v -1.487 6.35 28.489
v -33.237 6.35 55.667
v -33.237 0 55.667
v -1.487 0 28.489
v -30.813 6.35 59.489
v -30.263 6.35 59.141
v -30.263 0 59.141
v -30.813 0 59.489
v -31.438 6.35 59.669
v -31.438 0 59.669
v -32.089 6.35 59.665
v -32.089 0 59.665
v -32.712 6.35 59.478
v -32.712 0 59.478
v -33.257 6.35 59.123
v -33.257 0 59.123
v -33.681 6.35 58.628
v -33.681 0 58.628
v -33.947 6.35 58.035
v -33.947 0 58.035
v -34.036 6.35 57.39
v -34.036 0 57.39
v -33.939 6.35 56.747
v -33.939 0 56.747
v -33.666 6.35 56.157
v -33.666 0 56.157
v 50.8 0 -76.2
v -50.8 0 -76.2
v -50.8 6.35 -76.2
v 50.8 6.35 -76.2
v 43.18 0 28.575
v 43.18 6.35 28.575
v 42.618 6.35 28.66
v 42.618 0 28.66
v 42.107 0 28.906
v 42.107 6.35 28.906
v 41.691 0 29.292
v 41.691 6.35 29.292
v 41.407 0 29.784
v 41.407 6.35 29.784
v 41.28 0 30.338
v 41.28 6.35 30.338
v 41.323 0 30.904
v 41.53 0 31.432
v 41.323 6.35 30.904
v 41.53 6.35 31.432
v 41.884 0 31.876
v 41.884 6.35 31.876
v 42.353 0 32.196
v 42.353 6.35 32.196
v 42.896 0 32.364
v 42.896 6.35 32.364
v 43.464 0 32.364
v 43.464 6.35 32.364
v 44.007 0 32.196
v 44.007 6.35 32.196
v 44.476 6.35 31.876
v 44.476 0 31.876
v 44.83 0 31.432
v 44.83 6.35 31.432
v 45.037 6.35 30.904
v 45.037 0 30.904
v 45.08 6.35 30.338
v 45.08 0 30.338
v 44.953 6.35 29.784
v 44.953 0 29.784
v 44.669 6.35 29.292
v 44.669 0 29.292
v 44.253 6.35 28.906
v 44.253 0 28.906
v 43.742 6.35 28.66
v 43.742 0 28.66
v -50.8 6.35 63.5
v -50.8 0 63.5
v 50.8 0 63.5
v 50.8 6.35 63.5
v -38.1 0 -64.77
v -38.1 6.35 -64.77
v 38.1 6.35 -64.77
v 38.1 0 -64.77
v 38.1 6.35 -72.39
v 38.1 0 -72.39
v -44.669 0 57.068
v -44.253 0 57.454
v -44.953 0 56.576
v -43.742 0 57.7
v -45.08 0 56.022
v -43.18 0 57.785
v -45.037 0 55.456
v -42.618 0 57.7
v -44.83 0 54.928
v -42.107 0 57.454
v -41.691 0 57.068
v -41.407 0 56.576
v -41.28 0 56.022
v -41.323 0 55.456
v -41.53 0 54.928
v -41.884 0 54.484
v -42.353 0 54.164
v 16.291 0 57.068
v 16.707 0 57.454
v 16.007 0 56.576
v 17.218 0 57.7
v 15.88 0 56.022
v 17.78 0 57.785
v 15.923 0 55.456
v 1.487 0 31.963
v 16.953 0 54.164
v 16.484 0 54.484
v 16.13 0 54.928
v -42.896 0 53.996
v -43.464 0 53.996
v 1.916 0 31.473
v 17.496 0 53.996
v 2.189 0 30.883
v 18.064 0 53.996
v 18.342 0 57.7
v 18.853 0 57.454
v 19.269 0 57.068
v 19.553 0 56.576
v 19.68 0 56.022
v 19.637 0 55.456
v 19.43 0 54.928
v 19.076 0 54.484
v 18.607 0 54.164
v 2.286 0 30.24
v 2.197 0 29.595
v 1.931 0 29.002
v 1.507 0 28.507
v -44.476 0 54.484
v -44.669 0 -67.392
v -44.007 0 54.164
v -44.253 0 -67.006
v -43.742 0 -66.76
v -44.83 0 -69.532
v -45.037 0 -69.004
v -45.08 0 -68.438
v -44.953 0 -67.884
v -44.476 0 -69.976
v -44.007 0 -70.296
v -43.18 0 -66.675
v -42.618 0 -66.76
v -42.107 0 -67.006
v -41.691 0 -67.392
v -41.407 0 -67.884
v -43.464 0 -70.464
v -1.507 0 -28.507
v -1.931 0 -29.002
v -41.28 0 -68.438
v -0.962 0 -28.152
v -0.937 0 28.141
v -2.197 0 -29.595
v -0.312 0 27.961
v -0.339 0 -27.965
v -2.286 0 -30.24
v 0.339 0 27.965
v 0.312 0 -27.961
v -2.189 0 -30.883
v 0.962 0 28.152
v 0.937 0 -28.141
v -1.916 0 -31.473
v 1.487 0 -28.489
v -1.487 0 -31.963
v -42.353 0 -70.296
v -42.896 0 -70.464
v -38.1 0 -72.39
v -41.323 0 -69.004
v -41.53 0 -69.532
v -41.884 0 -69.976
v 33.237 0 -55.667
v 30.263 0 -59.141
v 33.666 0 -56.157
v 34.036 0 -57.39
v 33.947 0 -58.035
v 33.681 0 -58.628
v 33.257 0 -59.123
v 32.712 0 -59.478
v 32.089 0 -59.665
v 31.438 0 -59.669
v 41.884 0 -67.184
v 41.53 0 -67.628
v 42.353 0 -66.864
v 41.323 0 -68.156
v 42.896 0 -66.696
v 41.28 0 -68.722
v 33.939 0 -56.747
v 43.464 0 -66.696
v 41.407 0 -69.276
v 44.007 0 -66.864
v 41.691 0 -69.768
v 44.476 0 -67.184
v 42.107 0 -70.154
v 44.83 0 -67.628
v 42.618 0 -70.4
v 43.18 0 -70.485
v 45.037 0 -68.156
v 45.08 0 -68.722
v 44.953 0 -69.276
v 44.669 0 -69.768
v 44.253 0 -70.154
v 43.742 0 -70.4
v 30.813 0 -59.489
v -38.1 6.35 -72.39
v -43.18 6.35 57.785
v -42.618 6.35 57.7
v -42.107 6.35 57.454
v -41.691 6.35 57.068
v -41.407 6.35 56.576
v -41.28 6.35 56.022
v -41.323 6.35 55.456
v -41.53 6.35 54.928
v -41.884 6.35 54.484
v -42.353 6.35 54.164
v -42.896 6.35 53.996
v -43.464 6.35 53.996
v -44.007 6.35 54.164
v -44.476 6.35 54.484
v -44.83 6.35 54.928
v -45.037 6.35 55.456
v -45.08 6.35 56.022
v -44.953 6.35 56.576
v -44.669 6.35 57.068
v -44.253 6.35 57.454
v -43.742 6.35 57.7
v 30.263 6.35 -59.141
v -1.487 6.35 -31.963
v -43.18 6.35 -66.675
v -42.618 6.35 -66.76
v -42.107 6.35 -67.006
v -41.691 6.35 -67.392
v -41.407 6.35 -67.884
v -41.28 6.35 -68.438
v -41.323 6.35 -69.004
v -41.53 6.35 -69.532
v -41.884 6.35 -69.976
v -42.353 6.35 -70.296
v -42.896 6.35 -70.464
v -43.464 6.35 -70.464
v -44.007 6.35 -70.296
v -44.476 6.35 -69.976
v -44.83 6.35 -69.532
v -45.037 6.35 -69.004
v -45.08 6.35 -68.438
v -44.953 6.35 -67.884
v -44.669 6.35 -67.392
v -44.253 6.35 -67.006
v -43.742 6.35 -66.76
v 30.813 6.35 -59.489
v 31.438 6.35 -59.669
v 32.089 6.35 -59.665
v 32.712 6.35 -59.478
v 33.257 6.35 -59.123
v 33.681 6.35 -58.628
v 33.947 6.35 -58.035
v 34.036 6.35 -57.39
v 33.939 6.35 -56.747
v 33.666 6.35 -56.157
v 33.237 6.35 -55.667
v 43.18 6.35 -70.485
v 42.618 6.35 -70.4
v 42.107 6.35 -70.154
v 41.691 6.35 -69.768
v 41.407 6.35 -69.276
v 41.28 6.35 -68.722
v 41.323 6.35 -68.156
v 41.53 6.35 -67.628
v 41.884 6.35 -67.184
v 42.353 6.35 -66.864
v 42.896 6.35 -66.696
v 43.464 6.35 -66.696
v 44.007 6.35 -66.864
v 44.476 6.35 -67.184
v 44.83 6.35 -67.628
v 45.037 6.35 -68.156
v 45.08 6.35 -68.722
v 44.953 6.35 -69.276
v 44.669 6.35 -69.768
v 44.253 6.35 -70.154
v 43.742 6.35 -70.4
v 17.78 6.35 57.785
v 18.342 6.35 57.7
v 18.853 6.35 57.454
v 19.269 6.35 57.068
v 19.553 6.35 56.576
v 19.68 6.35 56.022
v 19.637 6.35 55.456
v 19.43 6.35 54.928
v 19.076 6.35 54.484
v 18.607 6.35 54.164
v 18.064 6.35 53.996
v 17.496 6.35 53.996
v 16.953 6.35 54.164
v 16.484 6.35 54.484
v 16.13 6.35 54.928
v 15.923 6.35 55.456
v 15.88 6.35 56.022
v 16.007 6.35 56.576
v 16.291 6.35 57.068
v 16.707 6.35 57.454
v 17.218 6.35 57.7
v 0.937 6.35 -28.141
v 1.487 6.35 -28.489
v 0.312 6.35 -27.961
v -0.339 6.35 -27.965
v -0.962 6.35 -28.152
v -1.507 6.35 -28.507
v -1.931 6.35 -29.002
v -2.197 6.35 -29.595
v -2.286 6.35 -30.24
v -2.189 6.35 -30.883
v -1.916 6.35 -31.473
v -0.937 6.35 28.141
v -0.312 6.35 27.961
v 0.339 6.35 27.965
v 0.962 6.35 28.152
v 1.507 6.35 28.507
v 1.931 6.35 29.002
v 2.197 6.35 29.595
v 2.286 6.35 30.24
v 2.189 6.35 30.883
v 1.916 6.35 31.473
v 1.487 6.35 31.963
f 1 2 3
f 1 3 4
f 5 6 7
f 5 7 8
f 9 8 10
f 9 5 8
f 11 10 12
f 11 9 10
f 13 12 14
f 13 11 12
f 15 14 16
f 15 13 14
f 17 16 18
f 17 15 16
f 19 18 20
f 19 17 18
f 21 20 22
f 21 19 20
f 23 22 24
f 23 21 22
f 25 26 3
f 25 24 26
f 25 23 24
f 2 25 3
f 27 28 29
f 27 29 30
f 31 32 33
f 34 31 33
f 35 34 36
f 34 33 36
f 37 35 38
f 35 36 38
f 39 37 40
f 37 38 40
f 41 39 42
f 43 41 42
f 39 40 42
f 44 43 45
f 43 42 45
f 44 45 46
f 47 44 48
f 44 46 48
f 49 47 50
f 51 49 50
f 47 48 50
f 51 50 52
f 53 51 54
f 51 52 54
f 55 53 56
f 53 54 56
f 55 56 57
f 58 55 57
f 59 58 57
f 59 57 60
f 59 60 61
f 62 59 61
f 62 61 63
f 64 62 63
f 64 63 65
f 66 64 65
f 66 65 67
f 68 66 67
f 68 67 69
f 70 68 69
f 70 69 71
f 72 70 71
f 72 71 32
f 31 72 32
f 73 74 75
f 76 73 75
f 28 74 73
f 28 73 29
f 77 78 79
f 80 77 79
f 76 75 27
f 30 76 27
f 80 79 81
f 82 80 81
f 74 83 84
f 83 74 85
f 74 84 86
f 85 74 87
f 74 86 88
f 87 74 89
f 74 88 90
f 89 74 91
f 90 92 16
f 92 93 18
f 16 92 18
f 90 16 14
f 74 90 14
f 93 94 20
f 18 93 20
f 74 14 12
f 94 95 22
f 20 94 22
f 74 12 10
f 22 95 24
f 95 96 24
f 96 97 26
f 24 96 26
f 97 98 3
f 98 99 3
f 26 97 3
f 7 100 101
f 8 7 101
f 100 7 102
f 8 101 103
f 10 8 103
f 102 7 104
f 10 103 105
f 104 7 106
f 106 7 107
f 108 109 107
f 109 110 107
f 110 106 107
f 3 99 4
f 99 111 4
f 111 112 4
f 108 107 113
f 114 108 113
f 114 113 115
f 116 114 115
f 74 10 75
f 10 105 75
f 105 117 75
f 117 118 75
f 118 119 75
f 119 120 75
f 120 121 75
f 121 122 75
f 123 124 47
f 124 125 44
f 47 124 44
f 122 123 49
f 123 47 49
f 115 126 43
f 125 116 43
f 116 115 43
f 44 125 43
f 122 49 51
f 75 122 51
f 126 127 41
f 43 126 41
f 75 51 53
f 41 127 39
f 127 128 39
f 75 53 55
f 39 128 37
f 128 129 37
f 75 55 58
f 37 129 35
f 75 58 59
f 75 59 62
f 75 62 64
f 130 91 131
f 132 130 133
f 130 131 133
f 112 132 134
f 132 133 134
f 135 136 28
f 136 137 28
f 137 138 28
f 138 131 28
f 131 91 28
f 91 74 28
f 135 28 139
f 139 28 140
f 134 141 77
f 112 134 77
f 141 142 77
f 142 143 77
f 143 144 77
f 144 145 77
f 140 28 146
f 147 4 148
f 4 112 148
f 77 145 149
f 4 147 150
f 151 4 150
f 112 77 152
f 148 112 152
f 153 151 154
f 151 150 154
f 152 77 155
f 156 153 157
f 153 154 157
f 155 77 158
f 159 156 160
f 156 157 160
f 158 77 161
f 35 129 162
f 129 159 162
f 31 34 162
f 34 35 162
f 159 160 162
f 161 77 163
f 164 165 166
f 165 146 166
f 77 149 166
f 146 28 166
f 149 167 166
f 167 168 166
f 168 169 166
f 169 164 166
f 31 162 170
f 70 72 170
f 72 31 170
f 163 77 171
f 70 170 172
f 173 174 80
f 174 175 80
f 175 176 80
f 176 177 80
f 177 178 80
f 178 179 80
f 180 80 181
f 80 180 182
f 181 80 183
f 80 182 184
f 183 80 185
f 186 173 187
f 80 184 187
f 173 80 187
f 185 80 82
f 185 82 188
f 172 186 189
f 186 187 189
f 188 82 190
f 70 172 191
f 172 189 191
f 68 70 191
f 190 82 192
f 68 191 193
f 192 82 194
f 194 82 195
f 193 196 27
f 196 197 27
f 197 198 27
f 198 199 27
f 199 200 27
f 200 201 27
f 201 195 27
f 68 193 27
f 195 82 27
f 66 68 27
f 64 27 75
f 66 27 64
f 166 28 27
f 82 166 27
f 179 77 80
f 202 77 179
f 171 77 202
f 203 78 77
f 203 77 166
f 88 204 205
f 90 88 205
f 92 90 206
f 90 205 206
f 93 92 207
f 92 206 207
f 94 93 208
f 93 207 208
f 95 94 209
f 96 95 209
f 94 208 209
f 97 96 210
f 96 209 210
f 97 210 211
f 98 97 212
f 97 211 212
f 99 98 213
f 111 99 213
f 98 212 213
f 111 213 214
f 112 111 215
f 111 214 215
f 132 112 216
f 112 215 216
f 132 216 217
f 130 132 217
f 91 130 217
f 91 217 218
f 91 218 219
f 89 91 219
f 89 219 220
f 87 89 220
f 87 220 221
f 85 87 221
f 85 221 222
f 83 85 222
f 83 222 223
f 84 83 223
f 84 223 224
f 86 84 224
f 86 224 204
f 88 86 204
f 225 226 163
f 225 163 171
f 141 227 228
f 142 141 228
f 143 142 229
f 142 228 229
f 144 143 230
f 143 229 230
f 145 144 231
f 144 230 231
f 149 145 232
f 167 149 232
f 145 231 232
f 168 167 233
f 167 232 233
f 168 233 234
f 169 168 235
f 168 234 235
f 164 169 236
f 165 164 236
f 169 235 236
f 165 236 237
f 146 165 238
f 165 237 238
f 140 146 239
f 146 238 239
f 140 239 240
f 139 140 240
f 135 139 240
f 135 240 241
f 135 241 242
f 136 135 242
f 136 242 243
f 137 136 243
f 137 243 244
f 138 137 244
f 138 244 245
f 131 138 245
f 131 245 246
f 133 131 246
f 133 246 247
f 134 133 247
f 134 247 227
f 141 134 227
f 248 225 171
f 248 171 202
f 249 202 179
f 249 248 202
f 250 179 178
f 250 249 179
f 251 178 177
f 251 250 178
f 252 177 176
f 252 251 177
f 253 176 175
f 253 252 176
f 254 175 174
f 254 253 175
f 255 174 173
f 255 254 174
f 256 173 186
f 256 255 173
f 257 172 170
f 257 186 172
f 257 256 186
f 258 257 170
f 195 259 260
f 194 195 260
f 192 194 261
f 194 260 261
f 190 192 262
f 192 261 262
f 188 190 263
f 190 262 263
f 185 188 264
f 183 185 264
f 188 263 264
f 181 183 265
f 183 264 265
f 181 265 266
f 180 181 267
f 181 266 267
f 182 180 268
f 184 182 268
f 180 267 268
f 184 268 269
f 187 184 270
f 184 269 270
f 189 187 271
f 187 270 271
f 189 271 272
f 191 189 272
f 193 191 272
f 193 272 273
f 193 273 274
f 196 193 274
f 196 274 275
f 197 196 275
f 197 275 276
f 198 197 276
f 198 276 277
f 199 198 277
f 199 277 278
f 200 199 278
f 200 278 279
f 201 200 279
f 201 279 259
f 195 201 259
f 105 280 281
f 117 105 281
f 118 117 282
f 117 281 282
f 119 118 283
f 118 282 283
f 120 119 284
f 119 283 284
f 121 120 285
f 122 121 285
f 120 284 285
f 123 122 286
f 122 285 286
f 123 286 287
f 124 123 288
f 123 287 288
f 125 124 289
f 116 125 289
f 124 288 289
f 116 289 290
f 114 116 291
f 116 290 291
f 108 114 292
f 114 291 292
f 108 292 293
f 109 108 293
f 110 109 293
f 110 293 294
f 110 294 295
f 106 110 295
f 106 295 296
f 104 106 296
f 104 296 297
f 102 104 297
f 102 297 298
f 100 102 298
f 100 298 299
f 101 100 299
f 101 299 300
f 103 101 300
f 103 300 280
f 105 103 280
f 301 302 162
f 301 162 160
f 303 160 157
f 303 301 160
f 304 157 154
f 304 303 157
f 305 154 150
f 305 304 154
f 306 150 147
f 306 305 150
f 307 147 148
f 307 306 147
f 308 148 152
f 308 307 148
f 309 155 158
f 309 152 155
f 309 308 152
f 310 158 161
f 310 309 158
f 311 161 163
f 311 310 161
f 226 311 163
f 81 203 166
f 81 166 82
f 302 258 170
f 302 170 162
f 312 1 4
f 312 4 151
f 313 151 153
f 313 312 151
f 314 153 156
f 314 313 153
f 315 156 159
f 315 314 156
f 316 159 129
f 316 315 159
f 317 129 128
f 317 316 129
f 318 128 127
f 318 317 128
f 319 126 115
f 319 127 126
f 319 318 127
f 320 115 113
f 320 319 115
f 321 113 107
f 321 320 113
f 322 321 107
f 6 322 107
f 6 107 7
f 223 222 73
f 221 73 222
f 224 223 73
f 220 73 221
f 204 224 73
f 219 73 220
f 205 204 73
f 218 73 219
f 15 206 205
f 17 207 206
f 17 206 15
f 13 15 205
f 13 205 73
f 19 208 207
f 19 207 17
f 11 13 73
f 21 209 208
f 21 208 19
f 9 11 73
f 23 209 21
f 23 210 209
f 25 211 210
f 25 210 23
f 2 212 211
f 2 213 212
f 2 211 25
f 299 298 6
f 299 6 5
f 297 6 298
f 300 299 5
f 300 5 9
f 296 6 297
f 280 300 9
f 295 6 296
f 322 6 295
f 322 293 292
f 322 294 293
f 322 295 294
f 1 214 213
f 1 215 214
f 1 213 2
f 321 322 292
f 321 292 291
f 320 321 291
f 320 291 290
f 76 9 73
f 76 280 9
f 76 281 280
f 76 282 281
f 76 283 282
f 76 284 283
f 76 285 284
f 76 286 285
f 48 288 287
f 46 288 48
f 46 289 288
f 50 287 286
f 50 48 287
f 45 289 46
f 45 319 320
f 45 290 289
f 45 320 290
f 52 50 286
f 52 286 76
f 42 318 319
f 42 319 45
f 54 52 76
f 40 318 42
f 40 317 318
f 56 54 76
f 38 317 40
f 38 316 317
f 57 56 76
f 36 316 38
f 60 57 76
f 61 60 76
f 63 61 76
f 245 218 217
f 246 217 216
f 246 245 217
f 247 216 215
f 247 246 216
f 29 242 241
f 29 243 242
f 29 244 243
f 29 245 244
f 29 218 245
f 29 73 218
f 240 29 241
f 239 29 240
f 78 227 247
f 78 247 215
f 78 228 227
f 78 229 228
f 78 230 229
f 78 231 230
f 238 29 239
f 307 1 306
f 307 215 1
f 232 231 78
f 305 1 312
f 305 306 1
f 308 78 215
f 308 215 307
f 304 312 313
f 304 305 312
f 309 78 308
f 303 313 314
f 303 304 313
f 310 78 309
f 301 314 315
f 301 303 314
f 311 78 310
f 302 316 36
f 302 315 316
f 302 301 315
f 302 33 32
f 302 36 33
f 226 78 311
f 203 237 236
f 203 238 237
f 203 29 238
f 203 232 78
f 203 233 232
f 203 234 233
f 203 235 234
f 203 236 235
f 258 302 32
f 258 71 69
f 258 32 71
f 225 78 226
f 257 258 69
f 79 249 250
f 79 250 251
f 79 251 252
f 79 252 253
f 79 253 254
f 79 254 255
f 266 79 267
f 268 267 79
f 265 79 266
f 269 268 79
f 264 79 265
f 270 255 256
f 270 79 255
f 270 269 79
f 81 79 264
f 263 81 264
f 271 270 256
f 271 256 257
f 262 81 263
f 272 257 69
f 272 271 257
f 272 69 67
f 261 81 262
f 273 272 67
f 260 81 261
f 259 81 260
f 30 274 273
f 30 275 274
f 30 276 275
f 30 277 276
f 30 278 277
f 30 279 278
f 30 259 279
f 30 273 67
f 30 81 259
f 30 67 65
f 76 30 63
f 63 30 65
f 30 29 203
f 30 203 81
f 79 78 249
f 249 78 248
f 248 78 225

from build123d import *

# Parameters (mm, degrees)
SKETCH1_W           = 101.6
SKETCH1_H           = 139.7
BOSS_EXTRUDE1_DEPTH = 6.35
CUT_EXTRUDE1_DEPTH  = 92.800885072
SKETCH4_W           = 76.2
SKETCH4_H           = 7.62
CUT_EXTRUDE2_DEPTH  = 92.800885072
SKETCH7_R           = 1.905
CUT_EXTRUDE3_DEPTH  = 92.800885072


with BuildPart() as part:
    # Sketch1 → Boss-Extrude1 (new body)
    with BuildSketch(Plane(origin=(0, 0, 0), x_dir=(1, 0, 0), z_dir=(0, 1, 0))):
        with Locations((0, 6.35)):
            Rectangle(SKETCH1_W, SKETCH1_H)
    extrude(amount=BOSS_EXTRUDE1_DEPTH)

    # Sketch3 → Cut-Extrude1 (cut, through all)
    with BuildSketch(Plane(origin=(0, 6.35, 0), x_dir=(1, 0, 0), z_dir=(0, 1, 0))):
        with BuildLine():
            Line((-1.486564617, 31.962640907), (30.263435383, 59.140640907))
            ThreePointArc((30.263435383, 59.140640907), (33.486640907, 58.890564617), (33.236564617, 55.667359093))
            Line((33.236564617, 55.667359093), (1.486564617, 28.489359093))
            ThreePointArc((1.486564617, 28.489359093), (-1.736640907, 28.739435383), (-1.486564617, 31.962640907))
        make_face()
        with BuildLine():
            Line((1.486564617, -31.962640907), (-30.263435383, -59.140640907))
            ThreePointArc((-30.263435383, -59.140640907), (-33.486640907, -58.890564617), (-33.236564617, -55.667359093))
            Line((-33.236564617, -55.667359093), (-1.486564617, -28.489359093))
            ThreePointArc((-1.486564617, -28.489359093), (1.736640907, -28.739435383), (1.486564617, -31.962640907))
        make_face()
    extrude(amount=-CUT_EXTRUDE1_DEPTH, mode=Mode.SUBTRACT)

    # Sketch4 → Cut-Extrude2 (cut, through all)
    with BuildSketch(Plane(origin=(0, 6.35, 0), x_dir=(1, 0, 0), z_dir=(0, 1, 0))):
        with Locations((0, 68.58)):
            Rectangle(SKETCH4_W, SKETCH4_H)
    extrude(amount=-CUT_EXTRUDE2_DEPTH, mode=Mode.SUBTRACT)

    # Sketch7 → Cut-Extrude3 (cut, through all)
    with BuildSketch(Plane(origin=(0, 6.35, 0), x_dir=(1, 0, 0), z_dir=(0, 1, 0))):
        with Locations(Location((-43.18, 68.58, 0), (0, 0, 270))):
            Circle(SKETCH7_R)
        with Locations(Location((43.18, 68.58, 0), (0, 0, 90))):
            Circle(SKETCH7_R)
        with Locations(Location((-43.18, -55.88, 0), (0, 0, 270))):
            Circle(SKETCH7_R)
        with Locations(Location((17.78, -55.88, 0), (0, 0, 270))):
            Circle(SKETCH7_R)
        with Locations(Location((43.18, -30.48, 0), (0, 0, 90))):
            Circle(SKETCH7_R)
    extrude(amount=-CUT_EXTRUDE3_DEPTH, mode=Mode.SUBTRACT)


solid = part.part
